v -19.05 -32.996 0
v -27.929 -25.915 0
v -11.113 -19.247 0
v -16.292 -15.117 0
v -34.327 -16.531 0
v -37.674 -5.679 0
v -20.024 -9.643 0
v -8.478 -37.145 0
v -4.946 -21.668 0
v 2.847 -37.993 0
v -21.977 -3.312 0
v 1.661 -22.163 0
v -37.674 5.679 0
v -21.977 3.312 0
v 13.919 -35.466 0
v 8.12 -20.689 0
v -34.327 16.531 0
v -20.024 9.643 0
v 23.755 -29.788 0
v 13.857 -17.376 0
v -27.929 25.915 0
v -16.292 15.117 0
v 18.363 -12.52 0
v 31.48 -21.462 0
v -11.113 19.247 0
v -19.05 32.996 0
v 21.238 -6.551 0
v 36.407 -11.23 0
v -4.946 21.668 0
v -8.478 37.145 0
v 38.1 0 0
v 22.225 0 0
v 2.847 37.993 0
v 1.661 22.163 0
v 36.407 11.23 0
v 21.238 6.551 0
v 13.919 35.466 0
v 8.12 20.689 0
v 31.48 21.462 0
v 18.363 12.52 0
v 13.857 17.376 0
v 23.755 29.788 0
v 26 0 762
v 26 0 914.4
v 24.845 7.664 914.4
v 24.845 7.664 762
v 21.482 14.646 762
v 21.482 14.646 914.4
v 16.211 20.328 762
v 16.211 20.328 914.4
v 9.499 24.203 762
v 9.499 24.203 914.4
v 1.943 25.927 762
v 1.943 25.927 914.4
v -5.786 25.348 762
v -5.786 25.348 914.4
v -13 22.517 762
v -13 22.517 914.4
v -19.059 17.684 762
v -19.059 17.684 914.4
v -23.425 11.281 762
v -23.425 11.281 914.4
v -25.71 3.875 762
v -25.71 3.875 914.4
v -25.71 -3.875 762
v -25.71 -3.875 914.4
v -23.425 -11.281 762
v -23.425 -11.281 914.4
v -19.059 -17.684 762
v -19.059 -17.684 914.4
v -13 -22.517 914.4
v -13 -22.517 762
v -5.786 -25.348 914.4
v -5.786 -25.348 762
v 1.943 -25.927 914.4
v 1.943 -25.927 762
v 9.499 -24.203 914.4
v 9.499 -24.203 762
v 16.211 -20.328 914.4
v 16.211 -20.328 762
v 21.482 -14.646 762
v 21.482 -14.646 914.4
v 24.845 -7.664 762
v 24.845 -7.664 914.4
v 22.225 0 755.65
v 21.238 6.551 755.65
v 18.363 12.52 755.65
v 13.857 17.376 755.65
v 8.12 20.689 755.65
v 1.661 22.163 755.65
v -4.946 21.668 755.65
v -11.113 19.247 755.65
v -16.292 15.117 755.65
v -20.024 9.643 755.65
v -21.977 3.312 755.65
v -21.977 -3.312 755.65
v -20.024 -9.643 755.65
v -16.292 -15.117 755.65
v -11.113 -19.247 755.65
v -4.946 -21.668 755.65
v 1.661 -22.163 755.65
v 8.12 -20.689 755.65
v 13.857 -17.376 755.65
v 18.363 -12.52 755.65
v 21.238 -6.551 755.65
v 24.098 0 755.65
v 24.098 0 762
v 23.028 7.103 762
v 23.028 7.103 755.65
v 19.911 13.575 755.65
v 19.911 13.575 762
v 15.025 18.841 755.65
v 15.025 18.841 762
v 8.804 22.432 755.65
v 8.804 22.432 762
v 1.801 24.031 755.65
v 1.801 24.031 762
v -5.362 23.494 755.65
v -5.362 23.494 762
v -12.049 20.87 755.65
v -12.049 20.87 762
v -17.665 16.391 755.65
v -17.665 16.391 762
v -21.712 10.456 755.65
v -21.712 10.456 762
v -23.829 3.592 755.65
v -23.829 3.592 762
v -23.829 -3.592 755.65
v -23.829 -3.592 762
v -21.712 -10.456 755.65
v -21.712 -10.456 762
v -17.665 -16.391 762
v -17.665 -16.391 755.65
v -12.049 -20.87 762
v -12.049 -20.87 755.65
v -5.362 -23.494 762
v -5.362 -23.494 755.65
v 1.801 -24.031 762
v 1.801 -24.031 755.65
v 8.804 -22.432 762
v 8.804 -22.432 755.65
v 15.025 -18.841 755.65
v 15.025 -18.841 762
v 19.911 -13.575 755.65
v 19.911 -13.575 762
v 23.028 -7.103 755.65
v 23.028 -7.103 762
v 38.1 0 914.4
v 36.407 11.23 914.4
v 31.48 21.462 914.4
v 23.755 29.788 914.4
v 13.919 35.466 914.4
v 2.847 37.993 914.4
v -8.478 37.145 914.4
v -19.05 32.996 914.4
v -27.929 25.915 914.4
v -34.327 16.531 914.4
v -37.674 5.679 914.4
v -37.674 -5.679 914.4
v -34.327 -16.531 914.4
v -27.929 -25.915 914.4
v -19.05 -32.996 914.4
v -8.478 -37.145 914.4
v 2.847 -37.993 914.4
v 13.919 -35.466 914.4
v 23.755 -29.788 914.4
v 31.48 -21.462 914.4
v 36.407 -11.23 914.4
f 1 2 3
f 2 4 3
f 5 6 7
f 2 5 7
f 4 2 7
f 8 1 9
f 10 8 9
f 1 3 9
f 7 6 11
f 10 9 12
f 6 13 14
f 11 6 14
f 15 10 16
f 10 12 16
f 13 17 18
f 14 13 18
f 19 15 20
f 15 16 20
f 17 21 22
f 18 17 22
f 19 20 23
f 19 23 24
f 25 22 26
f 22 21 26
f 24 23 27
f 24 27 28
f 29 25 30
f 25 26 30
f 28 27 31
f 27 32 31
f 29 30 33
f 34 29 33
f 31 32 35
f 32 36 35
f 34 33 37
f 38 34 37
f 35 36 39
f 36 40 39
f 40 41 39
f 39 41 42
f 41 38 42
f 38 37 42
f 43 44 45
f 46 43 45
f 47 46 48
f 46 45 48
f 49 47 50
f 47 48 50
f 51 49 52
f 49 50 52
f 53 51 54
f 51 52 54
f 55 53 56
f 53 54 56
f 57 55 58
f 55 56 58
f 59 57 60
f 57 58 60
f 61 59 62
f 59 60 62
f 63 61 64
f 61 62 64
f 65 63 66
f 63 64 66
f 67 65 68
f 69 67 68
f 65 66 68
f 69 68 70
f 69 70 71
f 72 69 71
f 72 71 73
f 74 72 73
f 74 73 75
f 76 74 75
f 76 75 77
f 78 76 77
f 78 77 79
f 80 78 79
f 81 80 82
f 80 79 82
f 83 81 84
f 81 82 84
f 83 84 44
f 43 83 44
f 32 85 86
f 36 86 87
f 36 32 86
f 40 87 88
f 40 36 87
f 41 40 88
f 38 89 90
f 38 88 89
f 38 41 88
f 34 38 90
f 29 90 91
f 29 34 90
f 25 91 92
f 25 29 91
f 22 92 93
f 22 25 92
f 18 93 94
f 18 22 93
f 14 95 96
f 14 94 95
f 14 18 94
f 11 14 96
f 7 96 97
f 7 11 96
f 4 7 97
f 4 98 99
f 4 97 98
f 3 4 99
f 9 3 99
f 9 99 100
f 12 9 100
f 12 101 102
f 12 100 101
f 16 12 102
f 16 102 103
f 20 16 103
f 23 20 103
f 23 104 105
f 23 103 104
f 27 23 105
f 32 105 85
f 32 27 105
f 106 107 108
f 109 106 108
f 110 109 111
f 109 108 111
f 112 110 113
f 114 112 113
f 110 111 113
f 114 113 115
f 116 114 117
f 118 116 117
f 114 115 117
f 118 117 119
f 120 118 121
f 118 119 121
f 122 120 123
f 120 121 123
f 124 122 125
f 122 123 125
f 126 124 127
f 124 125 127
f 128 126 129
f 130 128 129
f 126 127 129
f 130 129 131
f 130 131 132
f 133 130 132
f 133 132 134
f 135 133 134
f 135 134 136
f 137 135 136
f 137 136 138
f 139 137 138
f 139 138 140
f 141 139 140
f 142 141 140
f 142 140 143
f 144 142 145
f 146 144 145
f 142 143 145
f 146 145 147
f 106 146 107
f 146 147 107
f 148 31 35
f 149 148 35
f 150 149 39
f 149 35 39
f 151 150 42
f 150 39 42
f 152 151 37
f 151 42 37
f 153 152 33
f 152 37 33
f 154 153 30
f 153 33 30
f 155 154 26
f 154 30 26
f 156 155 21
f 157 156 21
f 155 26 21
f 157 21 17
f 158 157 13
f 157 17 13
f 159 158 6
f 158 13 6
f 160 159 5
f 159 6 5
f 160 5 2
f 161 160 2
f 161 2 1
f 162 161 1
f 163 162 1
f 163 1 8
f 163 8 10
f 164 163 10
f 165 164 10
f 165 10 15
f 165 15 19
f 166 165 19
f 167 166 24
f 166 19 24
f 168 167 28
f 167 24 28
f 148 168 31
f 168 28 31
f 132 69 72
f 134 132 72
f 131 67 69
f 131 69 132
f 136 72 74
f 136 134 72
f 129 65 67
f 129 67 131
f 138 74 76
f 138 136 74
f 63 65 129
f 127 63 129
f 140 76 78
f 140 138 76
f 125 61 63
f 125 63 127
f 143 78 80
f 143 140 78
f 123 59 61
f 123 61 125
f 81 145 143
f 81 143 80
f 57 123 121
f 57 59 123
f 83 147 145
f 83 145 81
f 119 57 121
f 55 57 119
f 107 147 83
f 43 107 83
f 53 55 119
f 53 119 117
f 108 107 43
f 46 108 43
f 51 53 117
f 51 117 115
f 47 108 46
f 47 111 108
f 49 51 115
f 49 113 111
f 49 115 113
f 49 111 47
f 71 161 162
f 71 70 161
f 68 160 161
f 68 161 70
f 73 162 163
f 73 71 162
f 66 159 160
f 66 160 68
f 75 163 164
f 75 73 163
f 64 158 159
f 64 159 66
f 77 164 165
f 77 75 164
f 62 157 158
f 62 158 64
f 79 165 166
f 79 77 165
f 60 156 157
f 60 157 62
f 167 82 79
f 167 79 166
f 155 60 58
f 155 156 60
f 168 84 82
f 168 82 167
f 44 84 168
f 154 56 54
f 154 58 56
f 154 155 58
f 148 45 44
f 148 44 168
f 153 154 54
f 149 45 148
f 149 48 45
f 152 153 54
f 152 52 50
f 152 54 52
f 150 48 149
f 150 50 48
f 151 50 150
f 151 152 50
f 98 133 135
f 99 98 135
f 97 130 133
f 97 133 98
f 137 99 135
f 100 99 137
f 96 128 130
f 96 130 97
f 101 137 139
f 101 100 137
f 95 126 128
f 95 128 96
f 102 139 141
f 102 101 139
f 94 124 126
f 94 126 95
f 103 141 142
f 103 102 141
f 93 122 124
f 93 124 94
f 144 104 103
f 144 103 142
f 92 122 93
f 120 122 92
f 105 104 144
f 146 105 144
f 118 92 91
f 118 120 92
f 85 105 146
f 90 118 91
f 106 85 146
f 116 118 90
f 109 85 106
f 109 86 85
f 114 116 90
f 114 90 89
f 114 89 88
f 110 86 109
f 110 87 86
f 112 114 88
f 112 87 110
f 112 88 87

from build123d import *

# Parameters (mm, degrees)
F0_R     = 38.1
F0_R_2   = 22.225
F1_DEPTH = 914.4
F3_R     = 26
F3_R_2   = 22.225
F4_DEPTH = 152.4
F5_R     = 24.09825
F6_DEPTH = 6.35


# Not quite as in the source:
# - a feature names something its author has since deleted; it is built from what else it names


with BuildPart() as f1:
    # F0 (on Top) → F1 (new body)
    with BuildSketch(Plane.XY):
        Circle(F0_R)
        Circle(F0_R_2, mode=Mode.SUBTRACT)
    extrude(amount=F1_DEPTH)

    # F3 (on face) → F4 (cut)
    with BuildSketch(Plane.XY.offset(914.4)):
        Circle(F3_R)
        Circle(F3_R_2, mode=Mode.SUBTRACT)
    extrude(amount=-F4_DEPTH, mode=Mode.SUBTRACT)

    # F5 (on face) → F6 (cut)
    with BuildSketch(Plane.XY.offset(762)):
        Circle(F5_R)
    extrude(amount=-F6_DEPTH, mode=Mode.SUBTRACT)


solid = f1.part
